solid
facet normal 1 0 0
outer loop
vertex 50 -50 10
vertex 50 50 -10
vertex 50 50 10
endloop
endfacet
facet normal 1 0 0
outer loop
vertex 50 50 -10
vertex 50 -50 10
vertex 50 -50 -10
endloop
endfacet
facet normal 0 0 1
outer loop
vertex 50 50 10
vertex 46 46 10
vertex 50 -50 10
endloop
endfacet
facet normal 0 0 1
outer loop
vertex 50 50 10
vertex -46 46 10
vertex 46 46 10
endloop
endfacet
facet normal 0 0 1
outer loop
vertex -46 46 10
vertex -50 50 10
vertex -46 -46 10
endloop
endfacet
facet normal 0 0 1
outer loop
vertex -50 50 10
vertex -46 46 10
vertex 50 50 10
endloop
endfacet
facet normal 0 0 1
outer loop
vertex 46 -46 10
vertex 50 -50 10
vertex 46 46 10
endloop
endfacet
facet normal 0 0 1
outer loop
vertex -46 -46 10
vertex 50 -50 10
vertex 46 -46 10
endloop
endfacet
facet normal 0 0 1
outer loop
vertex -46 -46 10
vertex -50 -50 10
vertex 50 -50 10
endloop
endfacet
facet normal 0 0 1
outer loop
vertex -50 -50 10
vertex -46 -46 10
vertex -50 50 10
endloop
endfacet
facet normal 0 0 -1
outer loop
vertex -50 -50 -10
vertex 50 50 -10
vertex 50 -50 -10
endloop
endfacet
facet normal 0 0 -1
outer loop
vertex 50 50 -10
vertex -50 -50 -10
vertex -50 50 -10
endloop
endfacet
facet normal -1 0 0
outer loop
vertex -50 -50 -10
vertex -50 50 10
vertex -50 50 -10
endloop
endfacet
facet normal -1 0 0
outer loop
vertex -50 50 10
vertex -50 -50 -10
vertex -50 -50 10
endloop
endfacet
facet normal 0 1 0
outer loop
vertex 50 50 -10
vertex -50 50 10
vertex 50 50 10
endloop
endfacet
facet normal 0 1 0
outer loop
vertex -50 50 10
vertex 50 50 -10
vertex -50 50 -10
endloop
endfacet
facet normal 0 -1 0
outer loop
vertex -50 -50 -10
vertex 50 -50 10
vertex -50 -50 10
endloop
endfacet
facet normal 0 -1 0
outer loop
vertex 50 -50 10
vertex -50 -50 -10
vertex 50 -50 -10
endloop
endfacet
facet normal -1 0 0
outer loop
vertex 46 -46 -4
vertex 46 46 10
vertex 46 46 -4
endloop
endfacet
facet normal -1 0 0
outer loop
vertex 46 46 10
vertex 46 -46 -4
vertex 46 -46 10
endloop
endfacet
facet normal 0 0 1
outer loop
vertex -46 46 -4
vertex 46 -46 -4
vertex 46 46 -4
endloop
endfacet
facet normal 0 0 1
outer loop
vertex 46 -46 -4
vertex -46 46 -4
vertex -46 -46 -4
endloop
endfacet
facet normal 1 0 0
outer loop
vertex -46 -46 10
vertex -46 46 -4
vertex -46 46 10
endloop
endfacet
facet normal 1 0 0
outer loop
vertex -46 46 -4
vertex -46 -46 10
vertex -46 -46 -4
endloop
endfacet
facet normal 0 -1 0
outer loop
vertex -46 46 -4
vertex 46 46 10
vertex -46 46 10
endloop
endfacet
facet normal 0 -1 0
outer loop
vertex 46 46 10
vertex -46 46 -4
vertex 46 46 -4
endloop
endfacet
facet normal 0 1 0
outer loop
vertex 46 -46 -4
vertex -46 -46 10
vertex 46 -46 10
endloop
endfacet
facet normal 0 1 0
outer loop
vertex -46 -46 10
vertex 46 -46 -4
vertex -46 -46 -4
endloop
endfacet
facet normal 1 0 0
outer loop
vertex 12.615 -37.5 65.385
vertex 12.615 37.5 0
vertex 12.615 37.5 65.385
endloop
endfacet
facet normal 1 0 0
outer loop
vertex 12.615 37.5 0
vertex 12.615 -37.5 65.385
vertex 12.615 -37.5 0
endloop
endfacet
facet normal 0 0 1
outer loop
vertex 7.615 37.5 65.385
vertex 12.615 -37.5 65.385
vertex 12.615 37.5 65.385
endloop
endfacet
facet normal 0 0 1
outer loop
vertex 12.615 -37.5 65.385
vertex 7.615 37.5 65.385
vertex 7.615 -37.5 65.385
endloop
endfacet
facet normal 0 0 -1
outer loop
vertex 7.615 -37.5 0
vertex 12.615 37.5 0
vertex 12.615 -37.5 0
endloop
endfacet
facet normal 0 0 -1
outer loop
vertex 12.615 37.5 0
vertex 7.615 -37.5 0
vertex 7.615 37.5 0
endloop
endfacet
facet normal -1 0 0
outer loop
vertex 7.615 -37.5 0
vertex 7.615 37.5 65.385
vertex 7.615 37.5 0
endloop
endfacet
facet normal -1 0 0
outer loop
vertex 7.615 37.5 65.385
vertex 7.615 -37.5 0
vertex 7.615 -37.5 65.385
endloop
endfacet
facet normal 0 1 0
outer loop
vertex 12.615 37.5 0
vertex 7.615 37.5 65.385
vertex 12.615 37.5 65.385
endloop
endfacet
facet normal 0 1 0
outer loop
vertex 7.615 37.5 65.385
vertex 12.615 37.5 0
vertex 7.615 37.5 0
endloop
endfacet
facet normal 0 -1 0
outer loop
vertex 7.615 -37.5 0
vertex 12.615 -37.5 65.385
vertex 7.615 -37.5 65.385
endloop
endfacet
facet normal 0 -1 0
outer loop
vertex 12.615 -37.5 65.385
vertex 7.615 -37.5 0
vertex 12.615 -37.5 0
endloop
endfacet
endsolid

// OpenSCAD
// file: phone.scad
//Phone model, for reference to the other modules
//in the model size will be added 3 mm in every direction for a beter fit

module phone() {
//Module variables
    tichn = 10; //tichness3
    width = 78 - 2*tichn; // 
    heigth = 151 - 2*tichn; //
    
//internal modules
    module edge (length = 10, edge_rad = tichn) {
        adj = 1; //adjust value
        
        rotate([0,0,0]) difference() {
            cylinder(r=edge_rad, h=length, center = true);
            translate([0,-(edge_rad+adj/2),-(length/2+adj/2)]) cube([edge_rad+adj, 2*edge_rad+adj, length+adj]);
            translate([-(edge_rad+adj/2),0,-(length/2+adj/2)]) cube([edge_rad+adj, edge_rad+adj, length+adj]);
        }
    }
    
    module edge_connect() {
        adj = 1;
        difference() {
            sphere(tichn);
            translate([tichn/2,0,0]) cube([tichn,2*tichn,2*tichn],true);
        }
    }
    
    module camera (diam = 10) { 
        heig = 8;
        //Camera Eye
        rotate([0,0,180]) union() {
            color("grey") minkowski () {
                $fn = 20;
                rotate([0,90,0]) cylinder(h=heig,d=diam,center= true);
                sphere(1); 
            }
            color("black") translate([heig/2+1,0,0]) rotate([0,90]) cylinder(h=2, d=3, center=true, $fn = 10);
        }              
    } 
    
    rotate([0,0,180]) {
    translate([-1,0,heigth/2+tichn-17]) camera();
    hull() {
        translate([tichn/2, width/2, heigth/2]) edge_connect();
        translate([tichn/2, -width/2, heigth/2]) edge_connect();
        translate([tichn/2, width/2, -heigth/2]) edge_connect();
        translate([tichn/2, -width/2, -heigth/2]) edge_connect();
        
        translate([tichn/2,width/2]) rotate([0,0,-90]) edge(heigth);
        translate([tichn/2,-width/2]) edge(heigth);
        translate([tichn/2,0,heigth/2]) rotate([-90,0,0]) edge(width);
        translate([tichn/2,0,-heigth/2]) rotate([90,0,0]) edge(width);
        rotate([0,0,0]) cube([tichn,width,heigth],true);
    } }
}

//phone();
// main file
//corpo do carrinho
include<phone.scad>

module body(width= 100, length= 100, heigth= 20 ) {
    tichn= 4; //wall tichness
    phone_h = 151;
    phone_angle = 30;
    suport_h = (phone_h/2)*sin(abs(90-phone_angle));
    
    
    difference() {
        cube([width,length,heigth],true);
        translate([0,0,tichn]) cube([width-2*tichn, length-2*tichn, heigth-tichn], true);  
    }
    translate([(phone_h)*cos(abs(90-phone_angle))-(phone_h/2)*cos(phone_angle), 0, suport_h/2]) cube([tichn+1, 75, suport_h], true);
    //translate(,0,0]) cube([tichn, 75, 55], true);
    
    %translate([0,0,(phone_h/2)*cos(phone_angle)]) rotate([0,phone_angle,0]) phone();
}

body();
